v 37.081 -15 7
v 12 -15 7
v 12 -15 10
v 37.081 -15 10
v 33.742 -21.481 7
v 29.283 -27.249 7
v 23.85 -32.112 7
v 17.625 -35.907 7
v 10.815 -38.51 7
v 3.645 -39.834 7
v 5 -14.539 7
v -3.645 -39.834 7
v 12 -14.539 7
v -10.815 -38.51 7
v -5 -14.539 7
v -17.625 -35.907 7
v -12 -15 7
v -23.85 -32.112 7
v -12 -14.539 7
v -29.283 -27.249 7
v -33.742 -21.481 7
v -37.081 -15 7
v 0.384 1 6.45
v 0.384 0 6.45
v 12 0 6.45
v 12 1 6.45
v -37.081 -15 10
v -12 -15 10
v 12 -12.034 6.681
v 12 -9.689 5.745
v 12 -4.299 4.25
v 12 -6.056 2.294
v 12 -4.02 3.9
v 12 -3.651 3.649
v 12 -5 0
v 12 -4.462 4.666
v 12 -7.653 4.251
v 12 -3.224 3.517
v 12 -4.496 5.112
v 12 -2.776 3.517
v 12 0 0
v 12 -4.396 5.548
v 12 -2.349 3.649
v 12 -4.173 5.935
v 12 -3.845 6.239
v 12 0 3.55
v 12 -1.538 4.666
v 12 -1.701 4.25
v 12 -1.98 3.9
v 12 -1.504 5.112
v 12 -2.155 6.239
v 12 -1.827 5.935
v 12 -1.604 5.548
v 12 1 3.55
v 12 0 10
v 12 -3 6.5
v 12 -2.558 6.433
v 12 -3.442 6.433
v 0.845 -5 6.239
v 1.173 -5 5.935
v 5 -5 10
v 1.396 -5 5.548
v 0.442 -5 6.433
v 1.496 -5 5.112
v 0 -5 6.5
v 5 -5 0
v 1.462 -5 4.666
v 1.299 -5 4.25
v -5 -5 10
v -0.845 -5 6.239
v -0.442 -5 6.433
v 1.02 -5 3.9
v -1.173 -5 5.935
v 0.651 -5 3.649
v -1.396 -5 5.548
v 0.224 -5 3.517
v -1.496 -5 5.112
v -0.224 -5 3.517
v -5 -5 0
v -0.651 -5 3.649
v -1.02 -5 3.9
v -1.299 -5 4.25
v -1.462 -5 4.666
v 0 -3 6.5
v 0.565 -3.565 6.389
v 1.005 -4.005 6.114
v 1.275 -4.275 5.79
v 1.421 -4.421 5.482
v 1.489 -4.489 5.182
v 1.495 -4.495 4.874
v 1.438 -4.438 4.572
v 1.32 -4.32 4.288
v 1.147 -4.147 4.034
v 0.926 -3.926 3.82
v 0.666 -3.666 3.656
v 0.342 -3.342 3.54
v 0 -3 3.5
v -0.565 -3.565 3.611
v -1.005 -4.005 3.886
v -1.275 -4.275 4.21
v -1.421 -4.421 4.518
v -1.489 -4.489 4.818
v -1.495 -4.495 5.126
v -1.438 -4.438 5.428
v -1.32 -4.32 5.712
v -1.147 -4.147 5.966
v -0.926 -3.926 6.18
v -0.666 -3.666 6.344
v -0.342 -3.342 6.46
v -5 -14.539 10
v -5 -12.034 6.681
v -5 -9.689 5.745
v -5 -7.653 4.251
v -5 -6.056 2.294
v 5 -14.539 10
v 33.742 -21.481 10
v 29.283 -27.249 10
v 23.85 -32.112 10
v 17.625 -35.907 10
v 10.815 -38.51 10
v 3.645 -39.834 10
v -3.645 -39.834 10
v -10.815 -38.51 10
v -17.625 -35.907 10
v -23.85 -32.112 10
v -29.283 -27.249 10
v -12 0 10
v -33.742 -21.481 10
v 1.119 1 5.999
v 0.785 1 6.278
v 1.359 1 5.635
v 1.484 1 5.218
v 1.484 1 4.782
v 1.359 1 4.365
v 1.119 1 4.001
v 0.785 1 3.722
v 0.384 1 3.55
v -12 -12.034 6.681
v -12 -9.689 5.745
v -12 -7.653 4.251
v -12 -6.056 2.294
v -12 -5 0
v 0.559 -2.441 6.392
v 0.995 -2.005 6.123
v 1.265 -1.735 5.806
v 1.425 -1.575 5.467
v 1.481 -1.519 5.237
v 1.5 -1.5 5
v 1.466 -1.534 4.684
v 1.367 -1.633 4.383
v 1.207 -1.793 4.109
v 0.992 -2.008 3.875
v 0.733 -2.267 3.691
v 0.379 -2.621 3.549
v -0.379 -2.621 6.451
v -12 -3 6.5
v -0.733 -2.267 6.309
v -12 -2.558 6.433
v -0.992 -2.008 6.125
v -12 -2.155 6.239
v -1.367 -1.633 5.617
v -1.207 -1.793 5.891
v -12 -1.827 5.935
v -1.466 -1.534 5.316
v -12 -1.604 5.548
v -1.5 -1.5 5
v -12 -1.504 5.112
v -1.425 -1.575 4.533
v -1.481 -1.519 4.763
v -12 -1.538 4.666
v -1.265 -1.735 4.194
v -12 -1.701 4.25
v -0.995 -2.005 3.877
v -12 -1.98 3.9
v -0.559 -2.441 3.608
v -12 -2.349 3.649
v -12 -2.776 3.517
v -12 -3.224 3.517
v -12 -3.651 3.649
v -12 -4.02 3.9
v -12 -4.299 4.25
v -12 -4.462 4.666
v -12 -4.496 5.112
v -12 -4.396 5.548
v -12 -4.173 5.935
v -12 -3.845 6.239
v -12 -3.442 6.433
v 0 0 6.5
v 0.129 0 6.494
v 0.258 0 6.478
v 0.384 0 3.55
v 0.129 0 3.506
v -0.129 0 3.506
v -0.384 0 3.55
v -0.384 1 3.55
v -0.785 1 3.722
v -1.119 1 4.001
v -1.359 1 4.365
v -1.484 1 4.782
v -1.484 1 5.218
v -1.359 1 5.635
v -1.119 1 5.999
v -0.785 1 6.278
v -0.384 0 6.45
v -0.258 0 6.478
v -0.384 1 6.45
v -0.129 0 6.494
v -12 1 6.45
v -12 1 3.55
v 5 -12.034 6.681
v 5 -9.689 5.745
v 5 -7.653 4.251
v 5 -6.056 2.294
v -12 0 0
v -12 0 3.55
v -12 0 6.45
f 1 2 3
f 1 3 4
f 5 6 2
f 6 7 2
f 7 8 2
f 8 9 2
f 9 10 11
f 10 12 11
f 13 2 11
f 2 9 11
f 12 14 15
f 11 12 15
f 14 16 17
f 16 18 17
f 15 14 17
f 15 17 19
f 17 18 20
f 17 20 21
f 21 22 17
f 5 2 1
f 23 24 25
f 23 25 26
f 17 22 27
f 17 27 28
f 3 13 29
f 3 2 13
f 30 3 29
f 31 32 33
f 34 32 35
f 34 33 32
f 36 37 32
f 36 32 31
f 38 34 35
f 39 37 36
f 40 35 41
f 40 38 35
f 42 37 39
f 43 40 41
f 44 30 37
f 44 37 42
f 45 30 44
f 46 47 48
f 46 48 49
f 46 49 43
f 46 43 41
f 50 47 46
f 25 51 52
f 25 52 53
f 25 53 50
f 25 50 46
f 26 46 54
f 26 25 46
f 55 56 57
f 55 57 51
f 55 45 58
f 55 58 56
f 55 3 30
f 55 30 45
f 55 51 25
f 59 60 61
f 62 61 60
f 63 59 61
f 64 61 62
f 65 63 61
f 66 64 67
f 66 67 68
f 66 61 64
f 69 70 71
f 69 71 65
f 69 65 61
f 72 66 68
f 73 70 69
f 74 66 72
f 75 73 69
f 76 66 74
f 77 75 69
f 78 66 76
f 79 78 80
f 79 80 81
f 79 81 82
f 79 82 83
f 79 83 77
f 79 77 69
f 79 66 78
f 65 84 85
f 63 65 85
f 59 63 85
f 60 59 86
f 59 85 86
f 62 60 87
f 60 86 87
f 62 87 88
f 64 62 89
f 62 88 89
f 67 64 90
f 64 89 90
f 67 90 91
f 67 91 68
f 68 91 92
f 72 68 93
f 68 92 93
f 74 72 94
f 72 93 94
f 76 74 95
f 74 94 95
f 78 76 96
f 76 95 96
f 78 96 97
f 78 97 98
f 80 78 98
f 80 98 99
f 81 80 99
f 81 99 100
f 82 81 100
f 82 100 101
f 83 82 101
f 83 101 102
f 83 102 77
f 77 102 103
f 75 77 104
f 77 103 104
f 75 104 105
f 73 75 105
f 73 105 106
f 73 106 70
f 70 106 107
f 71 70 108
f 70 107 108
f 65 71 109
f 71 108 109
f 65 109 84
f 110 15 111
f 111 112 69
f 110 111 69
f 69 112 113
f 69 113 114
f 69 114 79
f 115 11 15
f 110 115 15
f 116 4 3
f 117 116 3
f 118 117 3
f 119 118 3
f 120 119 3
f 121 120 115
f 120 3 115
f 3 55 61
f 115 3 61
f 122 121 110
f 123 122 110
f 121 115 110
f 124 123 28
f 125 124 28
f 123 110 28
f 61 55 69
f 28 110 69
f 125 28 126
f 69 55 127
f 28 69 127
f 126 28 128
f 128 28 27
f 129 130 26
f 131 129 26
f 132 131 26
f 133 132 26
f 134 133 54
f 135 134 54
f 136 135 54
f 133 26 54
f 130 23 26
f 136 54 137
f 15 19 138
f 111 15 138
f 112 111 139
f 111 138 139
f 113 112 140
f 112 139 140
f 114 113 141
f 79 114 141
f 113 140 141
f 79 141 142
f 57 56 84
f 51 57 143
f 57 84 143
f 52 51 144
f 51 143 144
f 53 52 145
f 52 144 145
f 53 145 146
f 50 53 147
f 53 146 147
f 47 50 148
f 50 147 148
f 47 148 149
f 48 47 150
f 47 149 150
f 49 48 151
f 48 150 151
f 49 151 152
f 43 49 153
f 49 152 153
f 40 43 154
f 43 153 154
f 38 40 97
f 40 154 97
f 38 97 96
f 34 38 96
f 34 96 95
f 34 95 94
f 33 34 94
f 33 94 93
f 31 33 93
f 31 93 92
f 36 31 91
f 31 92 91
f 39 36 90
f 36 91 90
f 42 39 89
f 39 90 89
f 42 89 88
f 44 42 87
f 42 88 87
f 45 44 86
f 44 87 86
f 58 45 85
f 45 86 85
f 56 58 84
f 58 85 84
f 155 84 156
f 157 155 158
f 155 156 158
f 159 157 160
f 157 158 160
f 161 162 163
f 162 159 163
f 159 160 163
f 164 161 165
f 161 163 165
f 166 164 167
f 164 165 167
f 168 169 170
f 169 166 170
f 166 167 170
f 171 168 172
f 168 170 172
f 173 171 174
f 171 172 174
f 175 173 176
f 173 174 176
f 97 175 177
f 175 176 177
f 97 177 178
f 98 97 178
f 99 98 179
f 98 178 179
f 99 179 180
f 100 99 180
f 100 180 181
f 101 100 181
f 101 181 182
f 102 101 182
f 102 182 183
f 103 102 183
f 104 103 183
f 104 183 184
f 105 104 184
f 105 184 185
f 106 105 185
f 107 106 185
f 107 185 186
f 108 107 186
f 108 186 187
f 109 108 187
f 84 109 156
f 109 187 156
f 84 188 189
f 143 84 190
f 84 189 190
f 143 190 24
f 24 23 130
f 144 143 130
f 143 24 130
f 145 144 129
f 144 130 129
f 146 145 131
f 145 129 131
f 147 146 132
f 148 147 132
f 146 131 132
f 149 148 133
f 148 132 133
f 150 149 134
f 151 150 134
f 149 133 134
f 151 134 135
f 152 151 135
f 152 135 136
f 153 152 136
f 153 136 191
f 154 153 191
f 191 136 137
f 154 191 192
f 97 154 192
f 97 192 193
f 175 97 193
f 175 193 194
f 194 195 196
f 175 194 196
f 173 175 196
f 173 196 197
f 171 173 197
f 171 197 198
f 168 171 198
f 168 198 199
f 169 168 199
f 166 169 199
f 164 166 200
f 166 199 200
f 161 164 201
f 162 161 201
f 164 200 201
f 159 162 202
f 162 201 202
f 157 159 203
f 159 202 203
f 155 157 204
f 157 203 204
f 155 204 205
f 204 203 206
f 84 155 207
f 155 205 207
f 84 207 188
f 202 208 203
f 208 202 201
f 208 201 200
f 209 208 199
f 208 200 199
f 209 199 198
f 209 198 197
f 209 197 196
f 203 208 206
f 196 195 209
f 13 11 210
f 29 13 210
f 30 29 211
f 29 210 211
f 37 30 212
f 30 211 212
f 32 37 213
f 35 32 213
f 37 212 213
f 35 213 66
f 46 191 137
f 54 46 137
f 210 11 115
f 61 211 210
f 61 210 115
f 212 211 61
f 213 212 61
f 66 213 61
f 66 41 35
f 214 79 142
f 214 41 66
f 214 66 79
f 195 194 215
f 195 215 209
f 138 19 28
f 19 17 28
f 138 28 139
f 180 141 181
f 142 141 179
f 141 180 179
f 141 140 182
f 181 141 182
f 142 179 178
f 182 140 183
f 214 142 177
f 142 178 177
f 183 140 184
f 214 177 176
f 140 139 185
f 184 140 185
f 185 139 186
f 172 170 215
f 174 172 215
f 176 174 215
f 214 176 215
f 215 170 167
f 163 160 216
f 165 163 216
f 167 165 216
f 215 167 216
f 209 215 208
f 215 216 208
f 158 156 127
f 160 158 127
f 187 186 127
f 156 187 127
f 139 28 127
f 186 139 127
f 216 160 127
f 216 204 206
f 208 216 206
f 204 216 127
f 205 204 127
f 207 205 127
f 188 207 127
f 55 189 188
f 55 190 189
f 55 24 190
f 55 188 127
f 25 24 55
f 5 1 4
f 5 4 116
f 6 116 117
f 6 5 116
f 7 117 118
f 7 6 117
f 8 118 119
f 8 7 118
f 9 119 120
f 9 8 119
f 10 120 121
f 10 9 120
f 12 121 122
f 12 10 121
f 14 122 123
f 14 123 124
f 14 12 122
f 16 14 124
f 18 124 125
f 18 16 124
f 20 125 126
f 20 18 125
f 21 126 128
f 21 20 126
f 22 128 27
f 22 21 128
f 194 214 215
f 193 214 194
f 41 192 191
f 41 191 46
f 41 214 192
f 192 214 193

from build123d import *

# Parameters (mm, degrees)
BOSS_EXTRUDE1_DEPTH     = 10
SKETCH2_W               = 2.9
SKETCH2_H               = 1
BOSS_EXTRUDE2_DEPTH     = 24
SKETCH3_R               = 1.5
CUT_EXTRUDE1_DEPTH      = 57.178287621
CUT_EXTRUDE2_DEPTH      = 56.452682697
CUT_EXTRUDE2_DEPTH_BACK = 56.452682697
SKETCH5_W               = 7
SKETCH5_H               = 35
FILLET1_START           = 1.5000001
FILLET1_DEPTH           = 10.4999999
FILLET1_START_2         = -12
FILLET1_2_DEPTH         = 10.499986243
FILLET1_START_3         = -1.500013757
FILLET1_3_DEPTH         = 3.000013857
FILLET1_4_OUTLINE_W     = 1.5
FILLET1_4_OUTLINE_H     = 6.418167134
SKETCH6_W               = 10
SKETCH6_H               = 9.539392014
CUT_EXTRUDE3_DEPTH      = 56.452682532
SKETCH7_R               = 1.5
CUT_EXTRUDE4_DEPTH      = 65.101043817


with BuildPart() as part:
    # Sketch1 → Boss-Extrude1 (new body)
    with BuildSketch(Plane.XY):
        with BuildLine():
            Line((-37.080992435, -15), (-12, -15))
            Line((-12, -15), (-12, 0))
            Line((-12, 0), (12, 0))
            Line((12, 0), (12, -15))
            Line((12, -15), (37.080992435, -15))
            ThreePointArc((37.080992435, -15), (0, -40), (-37.080992435, -15))
        make_face()
    extrude(amount=BOSS_EXTRUDE1_DEPTH)

    # Sketch2 → Boss-Extrude2 (add)
    with BuildSketch(Plane(origin=(12, 0, 0), x_dir=(0, 0, -1), z_dir=(1, 0, 0))):
        with Locations((-5, 0.5)):
            Rectangle(SKETCH2_W, SKETCH2_H)
    extrude(amount=-BOSS_EXTRUDE2_DEPTH)

    # Sketch3 → Cut-Extrude1 (cut, through all)
    with BuildSketch(Plane(origin=(0, 1, 0), x_dir=(1, 0, 0), z_dir=(0, 1, 0))):
        with Locations(Location((0, -5, 0), (0, 0, 270))):
            Circle(SKETCH3_R)
    extrude(amount=-CUT_EXTRUDE1_DEPTH, mode=Mode.SUBTRACT)

    # Sketch5 → Cut-Extrude2 (cut, two sides: drawn at the far end of the back side and taken through both)
    with BuildSketch(Plane(origin=(0, 0, 0), x_dir=(0, 0, -1), z_dir=(1, 0, 0)).offset(-CUT_EXTRUDE2_DEPTH_BACK)):
        with Locations((-3.5, -22.5)):
            Rectangle(SKETCH5_W, SKETCH5_H)
    extrude(amount=CUT_EXTRUDE2_DEPTH + CUT_EXTRUDE2_DEPTH_BACK, mode=Mode.SUBTRACT)

    # Fillet1: read off the stored shape, not the designer's step
    # Fillet1 outline → Fillet1 (add)
    with BuildSketch(Plane.YZ.offset(FILLET1_START)):
        with BuildLine():
            Line((-5, 7), (-14.539392014, 7))
            ThreePointArc((-14.539392014, 7), (-8.623312231, 5.062257748), (-5, 0))
            Line((-5, 0), (-5, 7))
        make_face()
    extrude(amount=FILLET1_DEPTH)

    # Fillet1 2 outline → Fillet1 2 (add)
    with BuildSketch(Plane.YZ.offset(FILLET1_START_2)):
        with BuildLine():
            Line((-5, 7), (-14.539392014, 7))
            ThreePointArc((-14.539392014, 7), (-8.623312231, 5.062257748), (-5, 0))
            Line((-5, 0), (-5, 7))
        make_face()
    extrude(amount=FILLET1_2_DEPTH)

    # Fillet1 3 outline → Fillet1 3 (add)
    with BuildSketch(Plane.YZ.offset(FILLET1_START_3)):
        with BuildLine():
            Line((-5, 7), (-14.539392014, 7))
            ThreePointArc((-14.539392014, 7), (-8.623312231, 5.062257748), (-5, 0))
            Line((-5, 0), (-5, 7))
        make_face()
    extrude(amount=FILLET1_3_DEPTH)

    # Fillet1 4 outline → Fillet1 4 (revolve, cut)
    with BuildSketch(Plane.XY.offset(5)):
        with Locations((0.75, -8.209083567)):
            Rectangle(FILLET1_4_OUTLINE_W, FILLET1_4_OUTLINE_H)
    revolve(axis=Axis((0, 0, 5), (0, 1, 0)), mode=Mode.SUBTRACT)

    # Sketch6 → Cut-Extrude3 (cut, through all)
    with BuildSketch(Plane(origin=(0, 0, 0), x_dir=(-1, 0, 0), z_dir=(0, 0, -1))):
        with Locations((0, -9.769696007)):
            Rectangle(SKETCH6_W, SKETCH6_H)
    extrude(amount=-CUT_EXTRUDE3_DEPTH, mode=Mode.SUBTRACT)

    # Sketch7 → Cut-Extrude4 (cut, through all)
    with BuildSketch(Plane.ZY.offset(12)):
        with Locations((5, -3)):
            Circle(SKETCH7_R)
    extrude(amount=-CUT_EXTRUDE4_DEPTH, mode=Mode.SUBTRACT)


solid = part.part
